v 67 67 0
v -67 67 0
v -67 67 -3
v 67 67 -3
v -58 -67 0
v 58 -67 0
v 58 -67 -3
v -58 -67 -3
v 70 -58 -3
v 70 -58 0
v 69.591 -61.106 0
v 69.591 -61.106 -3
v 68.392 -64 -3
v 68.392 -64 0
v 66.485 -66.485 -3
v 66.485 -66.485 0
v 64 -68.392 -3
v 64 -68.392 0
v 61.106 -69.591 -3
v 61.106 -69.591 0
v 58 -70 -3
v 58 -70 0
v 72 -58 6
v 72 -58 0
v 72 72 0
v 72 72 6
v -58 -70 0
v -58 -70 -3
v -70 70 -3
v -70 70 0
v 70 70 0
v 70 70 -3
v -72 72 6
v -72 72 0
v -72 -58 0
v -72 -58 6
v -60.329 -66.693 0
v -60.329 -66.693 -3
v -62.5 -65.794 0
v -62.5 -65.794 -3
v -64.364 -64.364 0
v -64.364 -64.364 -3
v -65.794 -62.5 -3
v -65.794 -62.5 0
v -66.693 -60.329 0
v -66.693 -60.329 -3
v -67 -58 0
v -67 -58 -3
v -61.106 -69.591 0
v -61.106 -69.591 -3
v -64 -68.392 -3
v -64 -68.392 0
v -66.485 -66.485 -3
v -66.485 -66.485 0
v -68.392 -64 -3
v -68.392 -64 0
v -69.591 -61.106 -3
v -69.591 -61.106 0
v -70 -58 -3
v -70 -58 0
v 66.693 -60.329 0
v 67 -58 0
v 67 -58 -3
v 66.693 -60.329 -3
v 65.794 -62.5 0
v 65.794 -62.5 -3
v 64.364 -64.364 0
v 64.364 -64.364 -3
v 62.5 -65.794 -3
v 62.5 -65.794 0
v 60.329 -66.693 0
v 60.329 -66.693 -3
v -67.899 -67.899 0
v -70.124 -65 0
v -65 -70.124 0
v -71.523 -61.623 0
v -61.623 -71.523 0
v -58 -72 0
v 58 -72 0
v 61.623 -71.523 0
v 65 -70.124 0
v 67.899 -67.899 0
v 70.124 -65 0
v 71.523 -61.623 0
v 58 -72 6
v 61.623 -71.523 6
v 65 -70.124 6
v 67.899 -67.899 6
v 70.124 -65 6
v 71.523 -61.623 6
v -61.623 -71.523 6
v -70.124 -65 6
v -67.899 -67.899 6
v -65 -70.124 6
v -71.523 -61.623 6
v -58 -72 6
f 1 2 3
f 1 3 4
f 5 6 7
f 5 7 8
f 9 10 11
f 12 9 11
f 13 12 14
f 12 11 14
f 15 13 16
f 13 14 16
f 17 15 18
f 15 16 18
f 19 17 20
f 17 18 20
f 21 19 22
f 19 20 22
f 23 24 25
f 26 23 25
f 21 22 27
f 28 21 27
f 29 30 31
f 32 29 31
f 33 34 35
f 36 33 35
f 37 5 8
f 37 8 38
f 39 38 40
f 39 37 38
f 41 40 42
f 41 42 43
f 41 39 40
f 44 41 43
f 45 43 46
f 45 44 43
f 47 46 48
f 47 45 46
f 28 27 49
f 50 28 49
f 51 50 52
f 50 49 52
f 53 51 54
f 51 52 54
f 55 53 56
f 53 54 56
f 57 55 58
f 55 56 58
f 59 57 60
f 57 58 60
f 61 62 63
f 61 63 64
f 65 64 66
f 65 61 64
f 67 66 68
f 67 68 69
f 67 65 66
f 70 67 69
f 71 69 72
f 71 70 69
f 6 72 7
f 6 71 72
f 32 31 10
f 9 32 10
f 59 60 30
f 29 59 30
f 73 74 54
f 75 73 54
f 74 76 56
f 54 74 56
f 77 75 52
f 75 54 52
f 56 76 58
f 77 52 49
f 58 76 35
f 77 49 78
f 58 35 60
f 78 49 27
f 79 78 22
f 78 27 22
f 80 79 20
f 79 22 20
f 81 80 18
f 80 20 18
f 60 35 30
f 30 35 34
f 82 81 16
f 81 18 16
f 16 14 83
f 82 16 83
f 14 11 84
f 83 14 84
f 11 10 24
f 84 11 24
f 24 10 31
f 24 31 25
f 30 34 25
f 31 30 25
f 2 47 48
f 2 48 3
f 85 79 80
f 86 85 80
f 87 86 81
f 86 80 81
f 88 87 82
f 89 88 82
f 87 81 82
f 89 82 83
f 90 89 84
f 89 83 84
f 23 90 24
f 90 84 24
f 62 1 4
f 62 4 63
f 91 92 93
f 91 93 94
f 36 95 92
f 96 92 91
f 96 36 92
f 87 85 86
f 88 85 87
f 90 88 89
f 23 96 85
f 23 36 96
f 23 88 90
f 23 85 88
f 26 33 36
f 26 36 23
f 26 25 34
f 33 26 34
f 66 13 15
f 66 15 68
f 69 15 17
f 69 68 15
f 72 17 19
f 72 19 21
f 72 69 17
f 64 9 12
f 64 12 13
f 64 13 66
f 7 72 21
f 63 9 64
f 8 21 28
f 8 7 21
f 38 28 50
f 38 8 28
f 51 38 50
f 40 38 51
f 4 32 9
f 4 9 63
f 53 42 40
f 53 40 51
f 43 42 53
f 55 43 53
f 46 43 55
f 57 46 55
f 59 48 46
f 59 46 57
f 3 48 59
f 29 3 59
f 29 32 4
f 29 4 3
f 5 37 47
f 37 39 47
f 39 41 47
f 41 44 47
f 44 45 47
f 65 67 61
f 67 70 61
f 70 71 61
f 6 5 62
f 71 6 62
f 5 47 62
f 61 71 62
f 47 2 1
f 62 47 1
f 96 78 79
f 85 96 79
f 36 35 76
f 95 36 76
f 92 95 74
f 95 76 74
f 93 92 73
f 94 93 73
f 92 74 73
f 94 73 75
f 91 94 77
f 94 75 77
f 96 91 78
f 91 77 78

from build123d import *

# Parameters (mm, degrees)
BOSS_EXTRUDE1_DEPTH = 6
BOSS_EXTRUDE2_DEPTH = 3


with BuildPart() as part:
    # Sketch1 → Boss-Extrude1 (new body)
    with BuildSketch(Plane.XY):
        with BuildLine():
            Line((-58, -72), (58, -72))
            ThreePointArc((58, -72), (67.899494937, -67.899494937), (72, -58))
            Line((72, -58), (72, 72))
            Line((72, 72), (-72, 72))
            Line((-72, 72), (-72, -58))
            ThreePointArc((-72, -58), (-67.899494937, -67.899494937), (-58, -72))
        make_face()
    extrude(amount=BOSS_EXTRUDE1_DEPTH)

    # Sketch2 → Boss-Extrude2 (add)
    with BuildSketch(Plane(origin=(0, 0, 0), x_dir=(-1, 0, 0), z_dir=(0, 0, -1))):
        with BuildLine():
            Line((-70, 70), (-70, -58))
            ThreePointArc((-70, -58), (-66.485281374, -66.485281374), (-58, -70))
            Line((-58, -70), (58, -70))
            ThreePointArc((58, -70), (66.485281374, -66.485281374), (70, -58))
            Line((70, -58), (70, 70))
            Line((70, 70), (-70, 70))
        make_face()
        with BuildLine():
            Line((-67, 67), (-67, -58))
            ThreePointArc((-67, -58), (-64.363961031, -64.363961031), (-58, -67))
            Line((-58, -67), (58, -67))
            ThreePointArc((58, -67), (64.363961031, -64.363961031), (67, -58))
            Line((67, -58), (67, 67))
            Line((67, 67), (-67, 67))
        make_face(mode=Mode.SUBTRACT)
    extrude(amount=BOSS_EXTRUDE2_DEPTH)


solid = part.part
